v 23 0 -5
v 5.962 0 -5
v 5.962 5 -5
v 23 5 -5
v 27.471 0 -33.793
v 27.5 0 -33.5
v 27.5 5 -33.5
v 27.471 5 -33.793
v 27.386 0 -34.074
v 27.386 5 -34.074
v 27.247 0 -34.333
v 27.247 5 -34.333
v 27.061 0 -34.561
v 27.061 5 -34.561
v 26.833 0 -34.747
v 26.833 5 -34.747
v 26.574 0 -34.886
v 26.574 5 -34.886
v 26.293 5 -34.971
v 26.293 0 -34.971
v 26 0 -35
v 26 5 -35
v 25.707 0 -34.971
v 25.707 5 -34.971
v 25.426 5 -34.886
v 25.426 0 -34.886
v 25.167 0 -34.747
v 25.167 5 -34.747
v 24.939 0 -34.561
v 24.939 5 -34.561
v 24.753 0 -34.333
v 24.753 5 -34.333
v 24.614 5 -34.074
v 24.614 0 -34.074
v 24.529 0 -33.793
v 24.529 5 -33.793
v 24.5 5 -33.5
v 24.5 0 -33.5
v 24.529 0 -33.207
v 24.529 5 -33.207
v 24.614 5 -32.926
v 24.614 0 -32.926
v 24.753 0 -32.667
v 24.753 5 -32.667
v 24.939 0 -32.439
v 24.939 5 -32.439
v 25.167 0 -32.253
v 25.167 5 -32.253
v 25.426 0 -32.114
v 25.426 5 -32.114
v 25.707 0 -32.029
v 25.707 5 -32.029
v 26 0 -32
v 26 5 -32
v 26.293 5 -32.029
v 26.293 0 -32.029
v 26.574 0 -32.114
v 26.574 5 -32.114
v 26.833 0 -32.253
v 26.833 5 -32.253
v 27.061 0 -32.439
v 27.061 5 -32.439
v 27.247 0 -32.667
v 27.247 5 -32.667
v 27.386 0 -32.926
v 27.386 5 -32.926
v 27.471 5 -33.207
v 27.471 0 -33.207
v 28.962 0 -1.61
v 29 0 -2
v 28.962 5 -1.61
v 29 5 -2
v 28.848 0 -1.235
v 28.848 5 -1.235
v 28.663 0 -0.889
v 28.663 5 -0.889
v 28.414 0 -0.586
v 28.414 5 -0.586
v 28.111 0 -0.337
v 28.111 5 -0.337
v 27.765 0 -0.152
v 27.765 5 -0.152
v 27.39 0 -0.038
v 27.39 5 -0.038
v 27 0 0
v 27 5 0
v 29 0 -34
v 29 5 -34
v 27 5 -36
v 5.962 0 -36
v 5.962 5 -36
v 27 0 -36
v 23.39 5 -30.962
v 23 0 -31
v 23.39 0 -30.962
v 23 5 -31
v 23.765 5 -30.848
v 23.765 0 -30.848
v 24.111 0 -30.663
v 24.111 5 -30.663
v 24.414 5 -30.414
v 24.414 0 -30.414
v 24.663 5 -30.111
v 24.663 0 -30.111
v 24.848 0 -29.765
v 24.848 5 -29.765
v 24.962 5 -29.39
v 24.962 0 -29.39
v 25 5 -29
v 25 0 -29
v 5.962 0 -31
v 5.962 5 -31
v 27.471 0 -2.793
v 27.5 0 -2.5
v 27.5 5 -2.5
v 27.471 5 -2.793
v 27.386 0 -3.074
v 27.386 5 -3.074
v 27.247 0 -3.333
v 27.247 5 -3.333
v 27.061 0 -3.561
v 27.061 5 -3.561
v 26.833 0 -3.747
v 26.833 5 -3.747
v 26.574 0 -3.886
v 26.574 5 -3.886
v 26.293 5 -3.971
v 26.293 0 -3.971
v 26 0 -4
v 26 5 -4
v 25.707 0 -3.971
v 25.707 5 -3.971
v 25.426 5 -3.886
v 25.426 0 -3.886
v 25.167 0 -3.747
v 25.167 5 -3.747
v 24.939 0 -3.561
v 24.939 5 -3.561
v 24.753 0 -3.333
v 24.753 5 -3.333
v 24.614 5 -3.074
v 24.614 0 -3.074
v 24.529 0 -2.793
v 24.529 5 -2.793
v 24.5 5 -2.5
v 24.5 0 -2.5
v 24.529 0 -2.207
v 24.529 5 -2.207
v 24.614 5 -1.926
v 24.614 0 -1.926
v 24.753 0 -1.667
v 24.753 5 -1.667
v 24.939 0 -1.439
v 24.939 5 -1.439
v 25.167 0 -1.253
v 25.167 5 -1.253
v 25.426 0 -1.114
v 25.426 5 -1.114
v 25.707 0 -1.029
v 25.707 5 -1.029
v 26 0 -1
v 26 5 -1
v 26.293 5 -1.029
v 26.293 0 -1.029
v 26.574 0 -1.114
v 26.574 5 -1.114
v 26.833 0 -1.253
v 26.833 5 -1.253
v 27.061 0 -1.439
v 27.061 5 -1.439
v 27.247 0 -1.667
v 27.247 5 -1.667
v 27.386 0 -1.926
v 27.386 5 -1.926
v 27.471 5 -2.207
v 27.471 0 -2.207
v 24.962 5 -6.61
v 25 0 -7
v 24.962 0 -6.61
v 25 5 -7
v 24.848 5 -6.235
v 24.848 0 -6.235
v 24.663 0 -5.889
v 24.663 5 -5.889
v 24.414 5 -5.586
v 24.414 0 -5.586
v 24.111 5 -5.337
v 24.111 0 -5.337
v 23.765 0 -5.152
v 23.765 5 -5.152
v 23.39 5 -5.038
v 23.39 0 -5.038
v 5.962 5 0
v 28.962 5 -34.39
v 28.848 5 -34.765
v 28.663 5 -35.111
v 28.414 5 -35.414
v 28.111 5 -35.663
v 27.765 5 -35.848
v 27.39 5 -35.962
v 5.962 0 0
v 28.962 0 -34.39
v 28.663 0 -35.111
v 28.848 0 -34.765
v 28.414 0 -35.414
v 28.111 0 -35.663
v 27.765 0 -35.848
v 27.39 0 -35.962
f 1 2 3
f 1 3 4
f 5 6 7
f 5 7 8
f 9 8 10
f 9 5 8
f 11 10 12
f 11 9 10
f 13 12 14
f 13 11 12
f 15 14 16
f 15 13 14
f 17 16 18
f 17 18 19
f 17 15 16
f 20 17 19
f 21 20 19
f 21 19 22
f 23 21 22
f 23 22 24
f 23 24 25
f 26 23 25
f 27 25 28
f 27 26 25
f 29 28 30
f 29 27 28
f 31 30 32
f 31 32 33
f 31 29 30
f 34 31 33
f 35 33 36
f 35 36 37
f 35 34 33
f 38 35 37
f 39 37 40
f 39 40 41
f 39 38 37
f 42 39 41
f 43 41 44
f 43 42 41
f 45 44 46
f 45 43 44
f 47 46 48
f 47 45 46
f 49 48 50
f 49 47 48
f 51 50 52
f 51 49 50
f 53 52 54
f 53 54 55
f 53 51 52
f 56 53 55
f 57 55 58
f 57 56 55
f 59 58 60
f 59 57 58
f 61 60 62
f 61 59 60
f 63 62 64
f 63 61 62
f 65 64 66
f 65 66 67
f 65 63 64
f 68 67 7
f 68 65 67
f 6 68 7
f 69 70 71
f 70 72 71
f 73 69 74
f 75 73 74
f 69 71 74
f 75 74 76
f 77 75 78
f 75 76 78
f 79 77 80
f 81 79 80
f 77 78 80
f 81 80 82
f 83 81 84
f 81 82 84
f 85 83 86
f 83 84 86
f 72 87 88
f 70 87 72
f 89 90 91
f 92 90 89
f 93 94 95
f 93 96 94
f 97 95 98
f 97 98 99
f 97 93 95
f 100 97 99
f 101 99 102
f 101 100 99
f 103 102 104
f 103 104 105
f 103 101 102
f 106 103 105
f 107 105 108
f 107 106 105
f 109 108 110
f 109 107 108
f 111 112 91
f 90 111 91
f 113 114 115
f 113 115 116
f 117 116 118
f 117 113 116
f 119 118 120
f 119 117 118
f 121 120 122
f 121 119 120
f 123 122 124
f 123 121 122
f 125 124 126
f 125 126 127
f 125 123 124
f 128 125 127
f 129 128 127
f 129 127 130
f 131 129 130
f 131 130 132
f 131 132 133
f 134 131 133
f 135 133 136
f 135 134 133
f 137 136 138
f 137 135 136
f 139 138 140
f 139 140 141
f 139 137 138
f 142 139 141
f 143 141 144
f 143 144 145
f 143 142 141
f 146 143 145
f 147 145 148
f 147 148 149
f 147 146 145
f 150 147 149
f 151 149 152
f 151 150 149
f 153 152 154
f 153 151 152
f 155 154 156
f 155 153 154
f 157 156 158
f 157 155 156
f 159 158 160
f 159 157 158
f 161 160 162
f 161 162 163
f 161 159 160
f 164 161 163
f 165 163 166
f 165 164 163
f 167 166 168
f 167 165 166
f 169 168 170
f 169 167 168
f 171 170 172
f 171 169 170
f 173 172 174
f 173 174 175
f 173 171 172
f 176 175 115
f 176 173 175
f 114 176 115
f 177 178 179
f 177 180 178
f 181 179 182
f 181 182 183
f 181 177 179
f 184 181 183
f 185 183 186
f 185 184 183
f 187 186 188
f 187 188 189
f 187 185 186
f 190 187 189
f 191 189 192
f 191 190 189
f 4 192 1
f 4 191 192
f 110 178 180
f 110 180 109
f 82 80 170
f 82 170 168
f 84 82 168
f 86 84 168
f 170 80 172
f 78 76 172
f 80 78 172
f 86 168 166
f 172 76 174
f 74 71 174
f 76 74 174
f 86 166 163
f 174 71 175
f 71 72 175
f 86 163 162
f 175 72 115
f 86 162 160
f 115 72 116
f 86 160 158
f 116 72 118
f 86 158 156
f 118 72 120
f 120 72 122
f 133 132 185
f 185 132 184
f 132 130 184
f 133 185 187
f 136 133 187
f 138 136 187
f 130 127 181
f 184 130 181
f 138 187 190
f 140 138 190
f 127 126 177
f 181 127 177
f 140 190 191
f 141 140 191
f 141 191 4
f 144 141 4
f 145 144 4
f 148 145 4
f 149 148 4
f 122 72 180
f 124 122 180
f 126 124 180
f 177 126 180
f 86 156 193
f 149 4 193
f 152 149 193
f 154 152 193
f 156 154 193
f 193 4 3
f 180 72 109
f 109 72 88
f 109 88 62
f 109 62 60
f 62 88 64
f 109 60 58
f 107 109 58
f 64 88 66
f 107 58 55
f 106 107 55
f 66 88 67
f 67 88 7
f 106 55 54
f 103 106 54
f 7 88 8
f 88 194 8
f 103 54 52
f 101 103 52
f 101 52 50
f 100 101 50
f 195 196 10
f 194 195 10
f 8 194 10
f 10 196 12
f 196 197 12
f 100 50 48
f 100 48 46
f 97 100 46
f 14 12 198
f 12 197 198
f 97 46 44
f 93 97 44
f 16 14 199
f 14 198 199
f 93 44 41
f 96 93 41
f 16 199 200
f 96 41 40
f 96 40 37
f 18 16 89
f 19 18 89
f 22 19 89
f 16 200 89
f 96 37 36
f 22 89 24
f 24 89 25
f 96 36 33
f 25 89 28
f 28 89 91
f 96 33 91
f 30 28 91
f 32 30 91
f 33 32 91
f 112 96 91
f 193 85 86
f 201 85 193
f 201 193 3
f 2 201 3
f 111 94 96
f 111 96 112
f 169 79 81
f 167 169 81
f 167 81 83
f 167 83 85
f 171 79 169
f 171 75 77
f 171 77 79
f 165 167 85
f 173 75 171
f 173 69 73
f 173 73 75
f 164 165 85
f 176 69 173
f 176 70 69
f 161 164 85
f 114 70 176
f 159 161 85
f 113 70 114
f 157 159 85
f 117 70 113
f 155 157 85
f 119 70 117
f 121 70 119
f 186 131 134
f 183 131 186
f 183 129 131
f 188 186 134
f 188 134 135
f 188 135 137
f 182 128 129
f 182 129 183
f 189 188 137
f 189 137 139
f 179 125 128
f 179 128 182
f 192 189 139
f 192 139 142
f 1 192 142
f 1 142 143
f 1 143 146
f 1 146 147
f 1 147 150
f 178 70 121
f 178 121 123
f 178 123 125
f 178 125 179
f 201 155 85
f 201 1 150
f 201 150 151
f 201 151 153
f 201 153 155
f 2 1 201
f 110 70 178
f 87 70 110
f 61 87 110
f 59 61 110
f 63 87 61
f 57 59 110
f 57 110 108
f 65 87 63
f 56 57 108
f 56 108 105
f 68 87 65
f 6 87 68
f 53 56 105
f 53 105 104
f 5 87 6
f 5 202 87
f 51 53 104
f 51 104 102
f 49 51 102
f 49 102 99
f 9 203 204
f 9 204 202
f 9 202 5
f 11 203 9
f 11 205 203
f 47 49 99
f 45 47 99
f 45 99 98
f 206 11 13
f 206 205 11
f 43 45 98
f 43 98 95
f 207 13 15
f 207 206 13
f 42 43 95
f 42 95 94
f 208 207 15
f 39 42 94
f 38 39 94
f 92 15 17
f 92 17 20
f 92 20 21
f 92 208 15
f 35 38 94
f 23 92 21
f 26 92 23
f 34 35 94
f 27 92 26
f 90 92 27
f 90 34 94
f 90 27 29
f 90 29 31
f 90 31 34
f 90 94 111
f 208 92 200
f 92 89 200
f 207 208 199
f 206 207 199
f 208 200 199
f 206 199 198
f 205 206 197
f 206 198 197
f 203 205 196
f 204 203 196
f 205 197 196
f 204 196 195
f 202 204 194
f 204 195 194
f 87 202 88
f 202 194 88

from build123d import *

# Parameters (mm, degrees)
SKETCH1_R           = 1.5
BOSS_EXTRUDE1_DEPTH = 5
FILLET1_R           = 2
SKETCH2_W           = 7.277082667
SKETCH2_H           = 36
CUT_EXTRUDE1_DEPTH  = 10


with BuildPart() as part:
    # Sketch1 → Boss-Extrude1 (new body)
    with BuildSketch(Plane(origin=(0, 0, 0), x_dir=(1, 0, 0), z_dir=(0, 1, 0))):
        Polygon((0, 31), (0, 36), (29, 36), (29, 0), (0, 0), (0, 5), (25, 5), (25, 31), align=None)
        with Locations((26, 2.5)):
            Circle(SKETCH1_R, mode=Mode.SUBTRACT)
        with Locations((26, 33.5)):
            Circle(SKETCH1_R, mode=Mode.SUBTRACT)
        with Locations((3, 33.5)):
            Circle(SKETCH1_R, mode=Mode.SUBTRACT)
        with Locations((3, 2.5)):
            Circle(SKETCH1_R, mode=Mode.SUBTRACT)
    extrude(amount=BOSS_EXTRUDE1_DEPTH)

    # Fillet1
    fillet1_edges = [part.edges().sort_by_distance(p)[0] for p in [
        (0, 2.5, -36),
        (29, 2.5, -36),
        (29, 2.5, 0),
        (0, 2.5, 0),
        (0, 2.5, -5),
        (25, 2.5, -5),
        (25, 2.5, -31),
        (0, 2.5, -31),
    ]]
    fillet(fillet1_edges, radius=FILLET1_R)

    # Sketch2 → Cut-Extrude1 (cut)
    with BuildSketch(Plane(origin=(0, 5, 0), x_dir=(1, 0, 0), z_dir=(0, 1, 0))):
        with Locations((2.323033499, 18)):
            Rectangle(SKETCH2_W, SKETCH2_H)
    extrude(amount=-CUT_EXTRUDE1_DEPTH, mode=Mode.SUBTRACT)


solid = part.part
